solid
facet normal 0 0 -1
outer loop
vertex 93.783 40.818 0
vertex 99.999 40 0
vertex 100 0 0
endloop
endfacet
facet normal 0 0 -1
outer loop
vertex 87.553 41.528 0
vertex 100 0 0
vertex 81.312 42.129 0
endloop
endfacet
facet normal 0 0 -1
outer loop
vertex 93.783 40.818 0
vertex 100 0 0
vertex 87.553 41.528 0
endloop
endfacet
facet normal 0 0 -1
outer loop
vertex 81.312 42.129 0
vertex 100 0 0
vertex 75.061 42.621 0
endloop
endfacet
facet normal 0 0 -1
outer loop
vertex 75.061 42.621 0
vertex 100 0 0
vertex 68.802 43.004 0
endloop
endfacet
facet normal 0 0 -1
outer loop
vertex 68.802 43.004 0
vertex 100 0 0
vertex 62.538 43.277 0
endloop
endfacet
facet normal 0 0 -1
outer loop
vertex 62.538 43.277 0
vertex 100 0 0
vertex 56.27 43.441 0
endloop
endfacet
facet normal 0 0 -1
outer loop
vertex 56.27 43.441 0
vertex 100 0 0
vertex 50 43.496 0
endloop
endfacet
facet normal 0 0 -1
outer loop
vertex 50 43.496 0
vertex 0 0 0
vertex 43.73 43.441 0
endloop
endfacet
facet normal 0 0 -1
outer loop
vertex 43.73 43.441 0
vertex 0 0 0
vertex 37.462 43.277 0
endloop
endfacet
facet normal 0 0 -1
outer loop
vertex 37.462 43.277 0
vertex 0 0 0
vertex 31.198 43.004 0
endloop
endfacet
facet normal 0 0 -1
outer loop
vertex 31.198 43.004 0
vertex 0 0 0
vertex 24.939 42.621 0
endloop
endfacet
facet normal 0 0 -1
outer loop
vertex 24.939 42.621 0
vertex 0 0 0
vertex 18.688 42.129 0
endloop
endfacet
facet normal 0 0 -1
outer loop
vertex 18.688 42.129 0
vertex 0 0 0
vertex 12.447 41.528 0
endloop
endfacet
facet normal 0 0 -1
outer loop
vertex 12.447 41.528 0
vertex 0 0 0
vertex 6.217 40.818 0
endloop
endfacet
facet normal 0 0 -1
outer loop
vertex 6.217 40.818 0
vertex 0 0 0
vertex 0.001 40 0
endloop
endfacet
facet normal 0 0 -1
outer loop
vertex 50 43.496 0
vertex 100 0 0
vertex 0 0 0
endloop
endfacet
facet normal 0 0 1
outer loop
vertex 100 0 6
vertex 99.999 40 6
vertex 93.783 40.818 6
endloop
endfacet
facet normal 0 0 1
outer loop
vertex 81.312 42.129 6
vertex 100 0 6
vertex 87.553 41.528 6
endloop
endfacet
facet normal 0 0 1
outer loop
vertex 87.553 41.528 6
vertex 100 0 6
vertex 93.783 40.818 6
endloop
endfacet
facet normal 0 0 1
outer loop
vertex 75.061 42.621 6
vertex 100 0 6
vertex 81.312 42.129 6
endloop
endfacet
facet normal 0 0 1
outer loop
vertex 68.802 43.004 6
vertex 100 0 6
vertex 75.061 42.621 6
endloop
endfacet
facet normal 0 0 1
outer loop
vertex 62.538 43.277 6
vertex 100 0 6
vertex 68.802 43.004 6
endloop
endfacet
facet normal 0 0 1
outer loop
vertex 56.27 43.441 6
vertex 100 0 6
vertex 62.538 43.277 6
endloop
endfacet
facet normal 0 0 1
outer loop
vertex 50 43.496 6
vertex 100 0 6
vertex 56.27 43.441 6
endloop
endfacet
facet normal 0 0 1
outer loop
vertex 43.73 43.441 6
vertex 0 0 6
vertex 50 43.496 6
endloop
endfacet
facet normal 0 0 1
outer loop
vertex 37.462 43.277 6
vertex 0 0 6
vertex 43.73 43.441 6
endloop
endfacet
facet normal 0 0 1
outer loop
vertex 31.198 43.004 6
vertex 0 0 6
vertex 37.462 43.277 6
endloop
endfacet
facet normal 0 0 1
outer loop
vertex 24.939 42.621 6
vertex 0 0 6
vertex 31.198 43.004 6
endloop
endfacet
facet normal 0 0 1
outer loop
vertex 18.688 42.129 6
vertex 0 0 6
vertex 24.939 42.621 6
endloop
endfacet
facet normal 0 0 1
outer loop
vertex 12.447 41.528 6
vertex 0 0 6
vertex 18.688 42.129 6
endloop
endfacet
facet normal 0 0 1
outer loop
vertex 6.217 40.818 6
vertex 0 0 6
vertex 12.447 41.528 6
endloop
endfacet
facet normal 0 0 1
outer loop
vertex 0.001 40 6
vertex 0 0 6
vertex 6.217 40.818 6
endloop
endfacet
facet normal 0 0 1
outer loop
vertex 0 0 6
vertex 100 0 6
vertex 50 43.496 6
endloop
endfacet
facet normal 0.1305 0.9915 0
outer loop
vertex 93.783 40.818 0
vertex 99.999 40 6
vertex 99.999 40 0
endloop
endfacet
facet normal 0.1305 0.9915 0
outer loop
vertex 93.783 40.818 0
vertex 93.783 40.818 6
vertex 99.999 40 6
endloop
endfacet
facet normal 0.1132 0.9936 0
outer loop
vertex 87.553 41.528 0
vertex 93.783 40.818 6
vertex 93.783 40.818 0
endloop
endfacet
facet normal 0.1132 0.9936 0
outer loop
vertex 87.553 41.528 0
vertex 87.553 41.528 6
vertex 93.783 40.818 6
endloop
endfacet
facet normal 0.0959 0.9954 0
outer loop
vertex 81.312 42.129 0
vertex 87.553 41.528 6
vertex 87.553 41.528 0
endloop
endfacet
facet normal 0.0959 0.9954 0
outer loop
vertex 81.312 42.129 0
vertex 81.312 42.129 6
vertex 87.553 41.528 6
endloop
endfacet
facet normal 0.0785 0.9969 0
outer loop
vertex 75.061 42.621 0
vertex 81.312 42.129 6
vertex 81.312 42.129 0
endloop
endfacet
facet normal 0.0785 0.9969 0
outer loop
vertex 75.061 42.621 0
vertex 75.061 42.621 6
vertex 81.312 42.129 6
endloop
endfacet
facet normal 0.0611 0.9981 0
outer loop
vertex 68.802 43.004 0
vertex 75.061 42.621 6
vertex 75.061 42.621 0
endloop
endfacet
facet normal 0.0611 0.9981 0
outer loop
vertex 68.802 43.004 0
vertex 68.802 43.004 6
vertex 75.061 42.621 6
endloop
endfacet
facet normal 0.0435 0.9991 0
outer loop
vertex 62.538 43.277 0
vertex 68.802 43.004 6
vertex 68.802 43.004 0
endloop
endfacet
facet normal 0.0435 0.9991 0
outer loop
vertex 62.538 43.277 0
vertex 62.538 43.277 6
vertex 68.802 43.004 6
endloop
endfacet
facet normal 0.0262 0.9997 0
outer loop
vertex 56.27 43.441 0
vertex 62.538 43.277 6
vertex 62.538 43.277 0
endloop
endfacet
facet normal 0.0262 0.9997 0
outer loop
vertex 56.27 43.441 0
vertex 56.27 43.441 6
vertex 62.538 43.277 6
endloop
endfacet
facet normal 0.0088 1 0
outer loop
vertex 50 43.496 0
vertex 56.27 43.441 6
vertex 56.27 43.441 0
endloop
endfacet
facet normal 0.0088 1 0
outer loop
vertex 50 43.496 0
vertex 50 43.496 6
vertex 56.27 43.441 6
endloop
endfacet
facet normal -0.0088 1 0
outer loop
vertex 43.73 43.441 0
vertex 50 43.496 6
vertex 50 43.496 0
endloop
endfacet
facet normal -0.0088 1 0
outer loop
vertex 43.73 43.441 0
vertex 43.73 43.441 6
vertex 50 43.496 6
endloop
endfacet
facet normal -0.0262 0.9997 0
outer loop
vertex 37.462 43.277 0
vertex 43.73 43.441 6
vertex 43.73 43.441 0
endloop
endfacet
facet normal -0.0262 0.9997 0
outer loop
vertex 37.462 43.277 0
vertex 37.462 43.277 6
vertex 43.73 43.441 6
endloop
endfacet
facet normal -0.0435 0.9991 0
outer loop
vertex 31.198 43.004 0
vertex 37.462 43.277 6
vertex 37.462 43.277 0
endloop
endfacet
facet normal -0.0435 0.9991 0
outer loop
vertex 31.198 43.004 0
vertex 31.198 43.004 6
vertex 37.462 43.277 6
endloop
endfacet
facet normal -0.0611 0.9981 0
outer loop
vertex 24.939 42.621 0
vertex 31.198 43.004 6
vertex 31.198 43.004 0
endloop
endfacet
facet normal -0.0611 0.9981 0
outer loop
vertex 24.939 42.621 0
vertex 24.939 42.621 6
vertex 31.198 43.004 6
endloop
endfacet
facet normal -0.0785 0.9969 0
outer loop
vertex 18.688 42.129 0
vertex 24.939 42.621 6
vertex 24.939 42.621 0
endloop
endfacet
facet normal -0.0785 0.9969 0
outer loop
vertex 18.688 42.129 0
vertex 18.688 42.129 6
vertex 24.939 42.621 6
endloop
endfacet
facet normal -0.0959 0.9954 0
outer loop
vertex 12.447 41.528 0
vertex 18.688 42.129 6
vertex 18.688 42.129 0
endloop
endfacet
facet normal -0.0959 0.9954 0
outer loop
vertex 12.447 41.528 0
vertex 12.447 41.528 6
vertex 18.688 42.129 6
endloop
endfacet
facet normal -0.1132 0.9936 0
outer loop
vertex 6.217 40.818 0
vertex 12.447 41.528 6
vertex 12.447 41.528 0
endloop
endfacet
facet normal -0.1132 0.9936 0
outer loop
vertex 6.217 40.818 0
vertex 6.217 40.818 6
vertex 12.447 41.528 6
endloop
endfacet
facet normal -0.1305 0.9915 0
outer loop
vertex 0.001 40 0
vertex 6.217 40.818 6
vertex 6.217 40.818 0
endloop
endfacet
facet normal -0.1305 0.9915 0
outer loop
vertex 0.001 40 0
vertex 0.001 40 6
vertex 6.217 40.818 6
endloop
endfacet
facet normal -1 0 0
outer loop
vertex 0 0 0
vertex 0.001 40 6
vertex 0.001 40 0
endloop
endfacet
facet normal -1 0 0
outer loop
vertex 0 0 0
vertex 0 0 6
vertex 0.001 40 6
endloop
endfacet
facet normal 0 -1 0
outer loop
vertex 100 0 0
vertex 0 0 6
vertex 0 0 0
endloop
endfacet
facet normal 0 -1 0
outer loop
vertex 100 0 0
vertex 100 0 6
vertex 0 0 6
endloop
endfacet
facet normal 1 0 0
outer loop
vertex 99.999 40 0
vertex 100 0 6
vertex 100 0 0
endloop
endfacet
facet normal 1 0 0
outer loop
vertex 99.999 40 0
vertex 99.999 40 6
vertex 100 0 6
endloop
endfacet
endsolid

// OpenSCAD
$fn = 32;

// ----------------------------------------------------------------------
// Arc profile plate: crown, 19 points
// ----------------------------------------------------------------------

// --- parameters (mm) ---
bar_l = 100;              // bar length, X
bar_w = 40;               // bar height at the ends, Y
arc_r = 359.26;           // radius of the crown arc
arc_angle = 16;           // crown arc angle, degrees
crown_rise = 3.5;         // rise of the crown over the ends
arc_step = 1;             // sampling step of the crown arc, degrees
plate_t = 6;              // plate thickness, Z
fit_tol = 0.1;            // declared fit tolerance (prompt contract)
free_tol = 0.5;           // declared free tolerance (prompt contract)

bbox_y = bar_w + crown_rise;  // full height with the crown

profile = [[99.999, 40], [93.783, 40.818], [87.553, 41.528], [81.312, 42.129], [75.061, 42.621], [68.802, 43.004], [62.538, 43.277], [56.27, 43.441], [50, 43.496], [43.73, 43.441], [37.462, 43.277], [31.198, 43.004], [24.939, 42.621], [18.688, 42.129], [12.447, 41.528], [6.217, 40.818], [0.001, 40], [0, 0], [100, 0]];  // primary outline, 19 points, counter clockwise

// --- the one profile operation ---
linear_extrude(height = plate_t) polygon(points = profile);
